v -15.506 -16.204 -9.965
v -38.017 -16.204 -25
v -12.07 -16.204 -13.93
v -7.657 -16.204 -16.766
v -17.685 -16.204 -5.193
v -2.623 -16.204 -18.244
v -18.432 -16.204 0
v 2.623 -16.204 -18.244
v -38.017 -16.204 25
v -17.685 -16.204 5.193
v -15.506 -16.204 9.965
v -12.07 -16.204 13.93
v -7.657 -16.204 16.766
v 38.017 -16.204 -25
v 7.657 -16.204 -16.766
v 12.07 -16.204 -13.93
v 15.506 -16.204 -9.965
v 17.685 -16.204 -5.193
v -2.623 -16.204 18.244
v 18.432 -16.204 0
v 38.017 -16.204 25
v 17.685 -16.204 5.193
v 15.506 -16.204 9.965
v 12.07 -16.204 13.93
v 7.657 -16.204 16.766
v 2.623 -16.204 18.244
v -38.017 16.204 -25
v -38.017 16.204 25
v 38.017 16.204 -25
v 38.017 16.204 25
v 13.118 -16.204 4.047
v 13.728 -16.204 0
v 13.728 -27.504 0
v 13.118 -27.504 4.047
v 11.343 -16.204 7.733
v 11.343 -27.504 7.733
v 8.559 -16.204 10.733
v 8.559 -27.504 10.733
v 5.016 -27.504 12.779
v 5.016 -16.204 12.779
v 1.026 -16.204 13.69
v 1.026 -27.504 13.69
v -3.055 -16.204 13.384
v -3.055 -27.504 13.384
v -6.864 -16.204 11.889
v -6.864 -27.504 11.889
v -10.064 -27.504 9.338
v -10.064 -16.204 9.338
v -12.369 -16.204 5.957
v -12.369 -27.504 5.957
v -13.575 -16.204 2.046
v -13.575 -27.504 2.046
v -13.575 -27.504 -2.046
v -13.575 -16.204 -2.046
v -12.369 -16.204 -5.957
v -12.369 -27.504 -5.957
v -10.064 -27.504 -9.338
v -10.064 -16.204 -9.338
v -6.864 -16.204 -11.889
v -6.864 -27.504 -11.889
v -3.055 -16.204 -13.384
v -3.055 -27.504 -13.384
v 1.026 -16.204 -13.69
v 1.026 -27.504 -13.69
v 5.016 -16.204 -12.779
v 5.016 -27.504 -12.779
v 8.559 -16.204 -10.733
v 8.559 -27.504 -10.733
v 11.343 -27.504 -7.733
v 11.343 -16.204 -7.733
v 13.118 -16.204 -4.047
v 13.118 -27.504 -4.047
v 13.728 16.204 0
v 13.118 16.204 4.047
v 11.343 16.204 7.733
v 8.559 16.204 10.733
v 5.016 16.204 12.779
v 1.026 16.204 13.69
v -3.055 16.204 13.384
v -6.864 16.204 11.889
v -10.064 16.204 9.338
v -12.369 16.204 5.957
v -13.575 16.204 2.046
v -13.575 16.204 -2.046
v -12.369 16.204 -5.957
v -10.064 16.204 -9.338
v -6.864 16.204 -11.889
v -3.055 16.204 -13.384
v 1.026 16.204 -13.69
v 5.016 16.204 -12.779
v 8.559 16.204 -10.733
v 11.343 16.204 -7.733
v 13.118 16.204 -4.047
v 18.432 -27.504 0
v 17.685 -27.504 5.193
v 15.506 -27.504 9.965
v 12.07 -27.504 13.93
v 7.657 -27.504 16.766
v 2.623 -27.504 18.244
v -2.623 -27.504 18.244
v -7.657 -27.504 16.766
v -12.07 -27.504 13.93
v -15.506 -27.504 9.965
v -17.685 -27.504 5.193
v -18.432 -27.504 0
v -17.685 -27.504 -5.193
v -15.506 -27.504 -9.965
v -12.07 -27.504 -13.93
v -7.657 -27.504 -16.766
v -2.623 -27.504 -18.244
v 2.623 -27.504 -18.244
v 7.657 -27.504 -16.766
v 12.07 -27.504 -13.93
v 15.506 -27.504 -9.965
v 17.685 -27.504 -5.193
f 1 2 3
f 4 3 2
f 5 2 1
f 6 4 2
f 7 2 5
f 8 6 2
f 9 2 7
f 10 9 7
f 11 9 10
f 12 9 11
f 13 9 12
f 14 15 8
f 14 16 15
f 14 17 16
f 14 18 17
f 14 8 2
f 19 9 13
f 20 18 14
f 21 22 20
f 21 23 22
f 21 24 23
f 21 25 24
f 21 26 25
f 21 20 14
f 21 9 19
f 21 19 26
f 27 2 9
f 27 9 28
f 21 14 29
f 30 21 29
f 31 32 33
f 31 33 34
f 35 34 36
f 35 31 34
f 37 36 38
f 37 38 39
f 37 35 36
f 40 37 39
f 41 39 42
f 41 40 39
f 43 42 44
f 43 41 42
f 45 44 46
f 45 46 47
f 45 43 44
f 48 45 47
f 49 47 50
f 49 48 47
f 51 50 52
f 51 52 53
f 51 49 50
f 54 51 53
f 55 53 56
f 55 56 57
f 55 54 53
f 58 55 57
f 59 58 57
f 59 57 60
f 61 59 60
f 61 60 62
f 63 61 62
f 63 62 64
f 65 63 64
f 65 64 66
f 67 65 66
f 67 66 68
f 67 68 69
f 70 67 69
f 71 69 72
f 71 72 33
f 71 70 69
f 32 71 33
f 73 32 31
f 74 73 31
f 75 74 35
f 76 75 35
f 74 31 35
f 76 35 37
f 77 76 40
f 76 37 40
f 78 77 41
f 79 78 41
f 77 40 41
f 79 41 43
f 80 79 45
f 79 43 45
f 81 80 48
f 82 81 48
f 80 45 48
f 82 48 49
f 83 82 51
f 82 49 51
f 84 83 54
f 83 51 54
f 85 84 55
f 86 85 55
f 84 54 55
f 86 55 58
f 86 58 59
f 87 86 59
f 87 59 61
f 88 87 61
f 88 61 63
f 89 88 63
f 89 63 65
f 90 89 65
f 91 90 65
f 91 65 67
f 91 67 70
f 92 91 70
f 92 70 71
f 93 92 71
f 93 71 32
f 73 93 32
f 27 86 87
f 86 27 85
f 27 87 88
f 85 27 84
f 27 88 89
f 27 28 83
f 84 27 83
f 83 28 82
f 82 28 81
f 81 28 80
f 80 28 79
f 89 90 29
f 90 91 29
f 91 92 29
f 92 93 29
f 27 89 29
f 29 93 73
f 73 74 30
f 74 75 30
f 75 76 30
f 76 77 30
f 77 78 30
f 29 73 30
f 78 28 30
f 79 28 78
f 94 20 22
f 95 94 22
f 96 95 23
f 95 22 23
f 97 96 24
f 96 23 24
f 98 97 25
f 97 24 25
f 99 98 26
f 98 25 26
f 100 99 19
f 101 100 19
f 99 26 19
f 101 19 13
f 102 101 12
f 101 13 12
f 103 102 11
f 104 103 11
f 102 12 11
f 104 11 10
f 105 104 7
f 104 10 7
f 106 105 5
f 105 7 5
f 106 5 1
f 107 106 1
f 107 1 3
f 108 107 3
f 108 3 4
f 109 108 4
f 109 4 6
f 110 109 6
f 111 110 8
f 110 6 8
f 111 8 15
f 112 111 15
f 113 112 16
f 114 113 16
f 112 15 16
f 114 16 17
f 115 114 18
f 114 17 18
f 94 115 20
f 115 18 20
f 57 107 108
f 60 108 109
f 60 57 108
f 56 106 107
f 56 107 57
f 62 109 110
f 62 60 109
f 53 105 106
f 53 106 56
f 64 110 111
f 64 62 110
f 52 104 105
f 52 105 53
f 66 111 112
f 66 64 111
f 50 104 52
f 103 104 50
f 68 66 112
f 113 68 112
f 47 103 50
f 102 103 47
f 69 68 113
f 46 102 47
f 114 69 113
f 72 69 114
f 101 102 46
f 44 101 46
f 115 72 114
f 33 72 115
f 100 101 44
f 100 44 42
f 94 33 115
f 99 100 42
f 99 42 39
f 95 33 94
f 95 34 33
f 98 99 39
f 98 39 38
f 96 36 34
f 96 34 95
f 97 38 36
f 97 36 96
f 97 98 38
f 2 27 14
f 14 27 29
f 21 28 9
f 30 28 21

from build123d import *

# Parameters (mm, degrees)
F0_W          = 76.034322
F0_H          = 32.407026
F1_DEPTH      = 25
F1_DEPTH_BACK = 25
F2_R          = 18.431692
F2_R_2        = 13.728348
F3_DEPTH      = 11.3
F3_FACE_R     = 13.728348
F4_DEPTH      = 32.407027


with BuildPart() as f1:
    # F0 (on Top) → F1 (new body, two sides)
    with BuildSketch(Plane.XY) as f1_sk:
        Rectangle(F0_W, F0_H)
    extrude(amount=F1_DEPTH)
    extrude(f1_sk.sketch, amount=-F1_DEPTH_BACK)

    # F2 (on face) → F3 (join)
    with BuildSketch(Plane.XZ.offset(16.203513)):
        Circle(F2_R)
        Circle(F2_R_2, mode=Mode.SUBTRACT)
    extrude(amount=F3_DEPTH)

    # F3_face (on face) → F4 (cut, through all)
    with BuildSketch(Plane.XZ.offset(16.203513)):
        Circle(F3_FACE_R)
    extrude(amount=-F4_DEPTH, mode=Mode.SUBTRACT)


solid = f1.part
